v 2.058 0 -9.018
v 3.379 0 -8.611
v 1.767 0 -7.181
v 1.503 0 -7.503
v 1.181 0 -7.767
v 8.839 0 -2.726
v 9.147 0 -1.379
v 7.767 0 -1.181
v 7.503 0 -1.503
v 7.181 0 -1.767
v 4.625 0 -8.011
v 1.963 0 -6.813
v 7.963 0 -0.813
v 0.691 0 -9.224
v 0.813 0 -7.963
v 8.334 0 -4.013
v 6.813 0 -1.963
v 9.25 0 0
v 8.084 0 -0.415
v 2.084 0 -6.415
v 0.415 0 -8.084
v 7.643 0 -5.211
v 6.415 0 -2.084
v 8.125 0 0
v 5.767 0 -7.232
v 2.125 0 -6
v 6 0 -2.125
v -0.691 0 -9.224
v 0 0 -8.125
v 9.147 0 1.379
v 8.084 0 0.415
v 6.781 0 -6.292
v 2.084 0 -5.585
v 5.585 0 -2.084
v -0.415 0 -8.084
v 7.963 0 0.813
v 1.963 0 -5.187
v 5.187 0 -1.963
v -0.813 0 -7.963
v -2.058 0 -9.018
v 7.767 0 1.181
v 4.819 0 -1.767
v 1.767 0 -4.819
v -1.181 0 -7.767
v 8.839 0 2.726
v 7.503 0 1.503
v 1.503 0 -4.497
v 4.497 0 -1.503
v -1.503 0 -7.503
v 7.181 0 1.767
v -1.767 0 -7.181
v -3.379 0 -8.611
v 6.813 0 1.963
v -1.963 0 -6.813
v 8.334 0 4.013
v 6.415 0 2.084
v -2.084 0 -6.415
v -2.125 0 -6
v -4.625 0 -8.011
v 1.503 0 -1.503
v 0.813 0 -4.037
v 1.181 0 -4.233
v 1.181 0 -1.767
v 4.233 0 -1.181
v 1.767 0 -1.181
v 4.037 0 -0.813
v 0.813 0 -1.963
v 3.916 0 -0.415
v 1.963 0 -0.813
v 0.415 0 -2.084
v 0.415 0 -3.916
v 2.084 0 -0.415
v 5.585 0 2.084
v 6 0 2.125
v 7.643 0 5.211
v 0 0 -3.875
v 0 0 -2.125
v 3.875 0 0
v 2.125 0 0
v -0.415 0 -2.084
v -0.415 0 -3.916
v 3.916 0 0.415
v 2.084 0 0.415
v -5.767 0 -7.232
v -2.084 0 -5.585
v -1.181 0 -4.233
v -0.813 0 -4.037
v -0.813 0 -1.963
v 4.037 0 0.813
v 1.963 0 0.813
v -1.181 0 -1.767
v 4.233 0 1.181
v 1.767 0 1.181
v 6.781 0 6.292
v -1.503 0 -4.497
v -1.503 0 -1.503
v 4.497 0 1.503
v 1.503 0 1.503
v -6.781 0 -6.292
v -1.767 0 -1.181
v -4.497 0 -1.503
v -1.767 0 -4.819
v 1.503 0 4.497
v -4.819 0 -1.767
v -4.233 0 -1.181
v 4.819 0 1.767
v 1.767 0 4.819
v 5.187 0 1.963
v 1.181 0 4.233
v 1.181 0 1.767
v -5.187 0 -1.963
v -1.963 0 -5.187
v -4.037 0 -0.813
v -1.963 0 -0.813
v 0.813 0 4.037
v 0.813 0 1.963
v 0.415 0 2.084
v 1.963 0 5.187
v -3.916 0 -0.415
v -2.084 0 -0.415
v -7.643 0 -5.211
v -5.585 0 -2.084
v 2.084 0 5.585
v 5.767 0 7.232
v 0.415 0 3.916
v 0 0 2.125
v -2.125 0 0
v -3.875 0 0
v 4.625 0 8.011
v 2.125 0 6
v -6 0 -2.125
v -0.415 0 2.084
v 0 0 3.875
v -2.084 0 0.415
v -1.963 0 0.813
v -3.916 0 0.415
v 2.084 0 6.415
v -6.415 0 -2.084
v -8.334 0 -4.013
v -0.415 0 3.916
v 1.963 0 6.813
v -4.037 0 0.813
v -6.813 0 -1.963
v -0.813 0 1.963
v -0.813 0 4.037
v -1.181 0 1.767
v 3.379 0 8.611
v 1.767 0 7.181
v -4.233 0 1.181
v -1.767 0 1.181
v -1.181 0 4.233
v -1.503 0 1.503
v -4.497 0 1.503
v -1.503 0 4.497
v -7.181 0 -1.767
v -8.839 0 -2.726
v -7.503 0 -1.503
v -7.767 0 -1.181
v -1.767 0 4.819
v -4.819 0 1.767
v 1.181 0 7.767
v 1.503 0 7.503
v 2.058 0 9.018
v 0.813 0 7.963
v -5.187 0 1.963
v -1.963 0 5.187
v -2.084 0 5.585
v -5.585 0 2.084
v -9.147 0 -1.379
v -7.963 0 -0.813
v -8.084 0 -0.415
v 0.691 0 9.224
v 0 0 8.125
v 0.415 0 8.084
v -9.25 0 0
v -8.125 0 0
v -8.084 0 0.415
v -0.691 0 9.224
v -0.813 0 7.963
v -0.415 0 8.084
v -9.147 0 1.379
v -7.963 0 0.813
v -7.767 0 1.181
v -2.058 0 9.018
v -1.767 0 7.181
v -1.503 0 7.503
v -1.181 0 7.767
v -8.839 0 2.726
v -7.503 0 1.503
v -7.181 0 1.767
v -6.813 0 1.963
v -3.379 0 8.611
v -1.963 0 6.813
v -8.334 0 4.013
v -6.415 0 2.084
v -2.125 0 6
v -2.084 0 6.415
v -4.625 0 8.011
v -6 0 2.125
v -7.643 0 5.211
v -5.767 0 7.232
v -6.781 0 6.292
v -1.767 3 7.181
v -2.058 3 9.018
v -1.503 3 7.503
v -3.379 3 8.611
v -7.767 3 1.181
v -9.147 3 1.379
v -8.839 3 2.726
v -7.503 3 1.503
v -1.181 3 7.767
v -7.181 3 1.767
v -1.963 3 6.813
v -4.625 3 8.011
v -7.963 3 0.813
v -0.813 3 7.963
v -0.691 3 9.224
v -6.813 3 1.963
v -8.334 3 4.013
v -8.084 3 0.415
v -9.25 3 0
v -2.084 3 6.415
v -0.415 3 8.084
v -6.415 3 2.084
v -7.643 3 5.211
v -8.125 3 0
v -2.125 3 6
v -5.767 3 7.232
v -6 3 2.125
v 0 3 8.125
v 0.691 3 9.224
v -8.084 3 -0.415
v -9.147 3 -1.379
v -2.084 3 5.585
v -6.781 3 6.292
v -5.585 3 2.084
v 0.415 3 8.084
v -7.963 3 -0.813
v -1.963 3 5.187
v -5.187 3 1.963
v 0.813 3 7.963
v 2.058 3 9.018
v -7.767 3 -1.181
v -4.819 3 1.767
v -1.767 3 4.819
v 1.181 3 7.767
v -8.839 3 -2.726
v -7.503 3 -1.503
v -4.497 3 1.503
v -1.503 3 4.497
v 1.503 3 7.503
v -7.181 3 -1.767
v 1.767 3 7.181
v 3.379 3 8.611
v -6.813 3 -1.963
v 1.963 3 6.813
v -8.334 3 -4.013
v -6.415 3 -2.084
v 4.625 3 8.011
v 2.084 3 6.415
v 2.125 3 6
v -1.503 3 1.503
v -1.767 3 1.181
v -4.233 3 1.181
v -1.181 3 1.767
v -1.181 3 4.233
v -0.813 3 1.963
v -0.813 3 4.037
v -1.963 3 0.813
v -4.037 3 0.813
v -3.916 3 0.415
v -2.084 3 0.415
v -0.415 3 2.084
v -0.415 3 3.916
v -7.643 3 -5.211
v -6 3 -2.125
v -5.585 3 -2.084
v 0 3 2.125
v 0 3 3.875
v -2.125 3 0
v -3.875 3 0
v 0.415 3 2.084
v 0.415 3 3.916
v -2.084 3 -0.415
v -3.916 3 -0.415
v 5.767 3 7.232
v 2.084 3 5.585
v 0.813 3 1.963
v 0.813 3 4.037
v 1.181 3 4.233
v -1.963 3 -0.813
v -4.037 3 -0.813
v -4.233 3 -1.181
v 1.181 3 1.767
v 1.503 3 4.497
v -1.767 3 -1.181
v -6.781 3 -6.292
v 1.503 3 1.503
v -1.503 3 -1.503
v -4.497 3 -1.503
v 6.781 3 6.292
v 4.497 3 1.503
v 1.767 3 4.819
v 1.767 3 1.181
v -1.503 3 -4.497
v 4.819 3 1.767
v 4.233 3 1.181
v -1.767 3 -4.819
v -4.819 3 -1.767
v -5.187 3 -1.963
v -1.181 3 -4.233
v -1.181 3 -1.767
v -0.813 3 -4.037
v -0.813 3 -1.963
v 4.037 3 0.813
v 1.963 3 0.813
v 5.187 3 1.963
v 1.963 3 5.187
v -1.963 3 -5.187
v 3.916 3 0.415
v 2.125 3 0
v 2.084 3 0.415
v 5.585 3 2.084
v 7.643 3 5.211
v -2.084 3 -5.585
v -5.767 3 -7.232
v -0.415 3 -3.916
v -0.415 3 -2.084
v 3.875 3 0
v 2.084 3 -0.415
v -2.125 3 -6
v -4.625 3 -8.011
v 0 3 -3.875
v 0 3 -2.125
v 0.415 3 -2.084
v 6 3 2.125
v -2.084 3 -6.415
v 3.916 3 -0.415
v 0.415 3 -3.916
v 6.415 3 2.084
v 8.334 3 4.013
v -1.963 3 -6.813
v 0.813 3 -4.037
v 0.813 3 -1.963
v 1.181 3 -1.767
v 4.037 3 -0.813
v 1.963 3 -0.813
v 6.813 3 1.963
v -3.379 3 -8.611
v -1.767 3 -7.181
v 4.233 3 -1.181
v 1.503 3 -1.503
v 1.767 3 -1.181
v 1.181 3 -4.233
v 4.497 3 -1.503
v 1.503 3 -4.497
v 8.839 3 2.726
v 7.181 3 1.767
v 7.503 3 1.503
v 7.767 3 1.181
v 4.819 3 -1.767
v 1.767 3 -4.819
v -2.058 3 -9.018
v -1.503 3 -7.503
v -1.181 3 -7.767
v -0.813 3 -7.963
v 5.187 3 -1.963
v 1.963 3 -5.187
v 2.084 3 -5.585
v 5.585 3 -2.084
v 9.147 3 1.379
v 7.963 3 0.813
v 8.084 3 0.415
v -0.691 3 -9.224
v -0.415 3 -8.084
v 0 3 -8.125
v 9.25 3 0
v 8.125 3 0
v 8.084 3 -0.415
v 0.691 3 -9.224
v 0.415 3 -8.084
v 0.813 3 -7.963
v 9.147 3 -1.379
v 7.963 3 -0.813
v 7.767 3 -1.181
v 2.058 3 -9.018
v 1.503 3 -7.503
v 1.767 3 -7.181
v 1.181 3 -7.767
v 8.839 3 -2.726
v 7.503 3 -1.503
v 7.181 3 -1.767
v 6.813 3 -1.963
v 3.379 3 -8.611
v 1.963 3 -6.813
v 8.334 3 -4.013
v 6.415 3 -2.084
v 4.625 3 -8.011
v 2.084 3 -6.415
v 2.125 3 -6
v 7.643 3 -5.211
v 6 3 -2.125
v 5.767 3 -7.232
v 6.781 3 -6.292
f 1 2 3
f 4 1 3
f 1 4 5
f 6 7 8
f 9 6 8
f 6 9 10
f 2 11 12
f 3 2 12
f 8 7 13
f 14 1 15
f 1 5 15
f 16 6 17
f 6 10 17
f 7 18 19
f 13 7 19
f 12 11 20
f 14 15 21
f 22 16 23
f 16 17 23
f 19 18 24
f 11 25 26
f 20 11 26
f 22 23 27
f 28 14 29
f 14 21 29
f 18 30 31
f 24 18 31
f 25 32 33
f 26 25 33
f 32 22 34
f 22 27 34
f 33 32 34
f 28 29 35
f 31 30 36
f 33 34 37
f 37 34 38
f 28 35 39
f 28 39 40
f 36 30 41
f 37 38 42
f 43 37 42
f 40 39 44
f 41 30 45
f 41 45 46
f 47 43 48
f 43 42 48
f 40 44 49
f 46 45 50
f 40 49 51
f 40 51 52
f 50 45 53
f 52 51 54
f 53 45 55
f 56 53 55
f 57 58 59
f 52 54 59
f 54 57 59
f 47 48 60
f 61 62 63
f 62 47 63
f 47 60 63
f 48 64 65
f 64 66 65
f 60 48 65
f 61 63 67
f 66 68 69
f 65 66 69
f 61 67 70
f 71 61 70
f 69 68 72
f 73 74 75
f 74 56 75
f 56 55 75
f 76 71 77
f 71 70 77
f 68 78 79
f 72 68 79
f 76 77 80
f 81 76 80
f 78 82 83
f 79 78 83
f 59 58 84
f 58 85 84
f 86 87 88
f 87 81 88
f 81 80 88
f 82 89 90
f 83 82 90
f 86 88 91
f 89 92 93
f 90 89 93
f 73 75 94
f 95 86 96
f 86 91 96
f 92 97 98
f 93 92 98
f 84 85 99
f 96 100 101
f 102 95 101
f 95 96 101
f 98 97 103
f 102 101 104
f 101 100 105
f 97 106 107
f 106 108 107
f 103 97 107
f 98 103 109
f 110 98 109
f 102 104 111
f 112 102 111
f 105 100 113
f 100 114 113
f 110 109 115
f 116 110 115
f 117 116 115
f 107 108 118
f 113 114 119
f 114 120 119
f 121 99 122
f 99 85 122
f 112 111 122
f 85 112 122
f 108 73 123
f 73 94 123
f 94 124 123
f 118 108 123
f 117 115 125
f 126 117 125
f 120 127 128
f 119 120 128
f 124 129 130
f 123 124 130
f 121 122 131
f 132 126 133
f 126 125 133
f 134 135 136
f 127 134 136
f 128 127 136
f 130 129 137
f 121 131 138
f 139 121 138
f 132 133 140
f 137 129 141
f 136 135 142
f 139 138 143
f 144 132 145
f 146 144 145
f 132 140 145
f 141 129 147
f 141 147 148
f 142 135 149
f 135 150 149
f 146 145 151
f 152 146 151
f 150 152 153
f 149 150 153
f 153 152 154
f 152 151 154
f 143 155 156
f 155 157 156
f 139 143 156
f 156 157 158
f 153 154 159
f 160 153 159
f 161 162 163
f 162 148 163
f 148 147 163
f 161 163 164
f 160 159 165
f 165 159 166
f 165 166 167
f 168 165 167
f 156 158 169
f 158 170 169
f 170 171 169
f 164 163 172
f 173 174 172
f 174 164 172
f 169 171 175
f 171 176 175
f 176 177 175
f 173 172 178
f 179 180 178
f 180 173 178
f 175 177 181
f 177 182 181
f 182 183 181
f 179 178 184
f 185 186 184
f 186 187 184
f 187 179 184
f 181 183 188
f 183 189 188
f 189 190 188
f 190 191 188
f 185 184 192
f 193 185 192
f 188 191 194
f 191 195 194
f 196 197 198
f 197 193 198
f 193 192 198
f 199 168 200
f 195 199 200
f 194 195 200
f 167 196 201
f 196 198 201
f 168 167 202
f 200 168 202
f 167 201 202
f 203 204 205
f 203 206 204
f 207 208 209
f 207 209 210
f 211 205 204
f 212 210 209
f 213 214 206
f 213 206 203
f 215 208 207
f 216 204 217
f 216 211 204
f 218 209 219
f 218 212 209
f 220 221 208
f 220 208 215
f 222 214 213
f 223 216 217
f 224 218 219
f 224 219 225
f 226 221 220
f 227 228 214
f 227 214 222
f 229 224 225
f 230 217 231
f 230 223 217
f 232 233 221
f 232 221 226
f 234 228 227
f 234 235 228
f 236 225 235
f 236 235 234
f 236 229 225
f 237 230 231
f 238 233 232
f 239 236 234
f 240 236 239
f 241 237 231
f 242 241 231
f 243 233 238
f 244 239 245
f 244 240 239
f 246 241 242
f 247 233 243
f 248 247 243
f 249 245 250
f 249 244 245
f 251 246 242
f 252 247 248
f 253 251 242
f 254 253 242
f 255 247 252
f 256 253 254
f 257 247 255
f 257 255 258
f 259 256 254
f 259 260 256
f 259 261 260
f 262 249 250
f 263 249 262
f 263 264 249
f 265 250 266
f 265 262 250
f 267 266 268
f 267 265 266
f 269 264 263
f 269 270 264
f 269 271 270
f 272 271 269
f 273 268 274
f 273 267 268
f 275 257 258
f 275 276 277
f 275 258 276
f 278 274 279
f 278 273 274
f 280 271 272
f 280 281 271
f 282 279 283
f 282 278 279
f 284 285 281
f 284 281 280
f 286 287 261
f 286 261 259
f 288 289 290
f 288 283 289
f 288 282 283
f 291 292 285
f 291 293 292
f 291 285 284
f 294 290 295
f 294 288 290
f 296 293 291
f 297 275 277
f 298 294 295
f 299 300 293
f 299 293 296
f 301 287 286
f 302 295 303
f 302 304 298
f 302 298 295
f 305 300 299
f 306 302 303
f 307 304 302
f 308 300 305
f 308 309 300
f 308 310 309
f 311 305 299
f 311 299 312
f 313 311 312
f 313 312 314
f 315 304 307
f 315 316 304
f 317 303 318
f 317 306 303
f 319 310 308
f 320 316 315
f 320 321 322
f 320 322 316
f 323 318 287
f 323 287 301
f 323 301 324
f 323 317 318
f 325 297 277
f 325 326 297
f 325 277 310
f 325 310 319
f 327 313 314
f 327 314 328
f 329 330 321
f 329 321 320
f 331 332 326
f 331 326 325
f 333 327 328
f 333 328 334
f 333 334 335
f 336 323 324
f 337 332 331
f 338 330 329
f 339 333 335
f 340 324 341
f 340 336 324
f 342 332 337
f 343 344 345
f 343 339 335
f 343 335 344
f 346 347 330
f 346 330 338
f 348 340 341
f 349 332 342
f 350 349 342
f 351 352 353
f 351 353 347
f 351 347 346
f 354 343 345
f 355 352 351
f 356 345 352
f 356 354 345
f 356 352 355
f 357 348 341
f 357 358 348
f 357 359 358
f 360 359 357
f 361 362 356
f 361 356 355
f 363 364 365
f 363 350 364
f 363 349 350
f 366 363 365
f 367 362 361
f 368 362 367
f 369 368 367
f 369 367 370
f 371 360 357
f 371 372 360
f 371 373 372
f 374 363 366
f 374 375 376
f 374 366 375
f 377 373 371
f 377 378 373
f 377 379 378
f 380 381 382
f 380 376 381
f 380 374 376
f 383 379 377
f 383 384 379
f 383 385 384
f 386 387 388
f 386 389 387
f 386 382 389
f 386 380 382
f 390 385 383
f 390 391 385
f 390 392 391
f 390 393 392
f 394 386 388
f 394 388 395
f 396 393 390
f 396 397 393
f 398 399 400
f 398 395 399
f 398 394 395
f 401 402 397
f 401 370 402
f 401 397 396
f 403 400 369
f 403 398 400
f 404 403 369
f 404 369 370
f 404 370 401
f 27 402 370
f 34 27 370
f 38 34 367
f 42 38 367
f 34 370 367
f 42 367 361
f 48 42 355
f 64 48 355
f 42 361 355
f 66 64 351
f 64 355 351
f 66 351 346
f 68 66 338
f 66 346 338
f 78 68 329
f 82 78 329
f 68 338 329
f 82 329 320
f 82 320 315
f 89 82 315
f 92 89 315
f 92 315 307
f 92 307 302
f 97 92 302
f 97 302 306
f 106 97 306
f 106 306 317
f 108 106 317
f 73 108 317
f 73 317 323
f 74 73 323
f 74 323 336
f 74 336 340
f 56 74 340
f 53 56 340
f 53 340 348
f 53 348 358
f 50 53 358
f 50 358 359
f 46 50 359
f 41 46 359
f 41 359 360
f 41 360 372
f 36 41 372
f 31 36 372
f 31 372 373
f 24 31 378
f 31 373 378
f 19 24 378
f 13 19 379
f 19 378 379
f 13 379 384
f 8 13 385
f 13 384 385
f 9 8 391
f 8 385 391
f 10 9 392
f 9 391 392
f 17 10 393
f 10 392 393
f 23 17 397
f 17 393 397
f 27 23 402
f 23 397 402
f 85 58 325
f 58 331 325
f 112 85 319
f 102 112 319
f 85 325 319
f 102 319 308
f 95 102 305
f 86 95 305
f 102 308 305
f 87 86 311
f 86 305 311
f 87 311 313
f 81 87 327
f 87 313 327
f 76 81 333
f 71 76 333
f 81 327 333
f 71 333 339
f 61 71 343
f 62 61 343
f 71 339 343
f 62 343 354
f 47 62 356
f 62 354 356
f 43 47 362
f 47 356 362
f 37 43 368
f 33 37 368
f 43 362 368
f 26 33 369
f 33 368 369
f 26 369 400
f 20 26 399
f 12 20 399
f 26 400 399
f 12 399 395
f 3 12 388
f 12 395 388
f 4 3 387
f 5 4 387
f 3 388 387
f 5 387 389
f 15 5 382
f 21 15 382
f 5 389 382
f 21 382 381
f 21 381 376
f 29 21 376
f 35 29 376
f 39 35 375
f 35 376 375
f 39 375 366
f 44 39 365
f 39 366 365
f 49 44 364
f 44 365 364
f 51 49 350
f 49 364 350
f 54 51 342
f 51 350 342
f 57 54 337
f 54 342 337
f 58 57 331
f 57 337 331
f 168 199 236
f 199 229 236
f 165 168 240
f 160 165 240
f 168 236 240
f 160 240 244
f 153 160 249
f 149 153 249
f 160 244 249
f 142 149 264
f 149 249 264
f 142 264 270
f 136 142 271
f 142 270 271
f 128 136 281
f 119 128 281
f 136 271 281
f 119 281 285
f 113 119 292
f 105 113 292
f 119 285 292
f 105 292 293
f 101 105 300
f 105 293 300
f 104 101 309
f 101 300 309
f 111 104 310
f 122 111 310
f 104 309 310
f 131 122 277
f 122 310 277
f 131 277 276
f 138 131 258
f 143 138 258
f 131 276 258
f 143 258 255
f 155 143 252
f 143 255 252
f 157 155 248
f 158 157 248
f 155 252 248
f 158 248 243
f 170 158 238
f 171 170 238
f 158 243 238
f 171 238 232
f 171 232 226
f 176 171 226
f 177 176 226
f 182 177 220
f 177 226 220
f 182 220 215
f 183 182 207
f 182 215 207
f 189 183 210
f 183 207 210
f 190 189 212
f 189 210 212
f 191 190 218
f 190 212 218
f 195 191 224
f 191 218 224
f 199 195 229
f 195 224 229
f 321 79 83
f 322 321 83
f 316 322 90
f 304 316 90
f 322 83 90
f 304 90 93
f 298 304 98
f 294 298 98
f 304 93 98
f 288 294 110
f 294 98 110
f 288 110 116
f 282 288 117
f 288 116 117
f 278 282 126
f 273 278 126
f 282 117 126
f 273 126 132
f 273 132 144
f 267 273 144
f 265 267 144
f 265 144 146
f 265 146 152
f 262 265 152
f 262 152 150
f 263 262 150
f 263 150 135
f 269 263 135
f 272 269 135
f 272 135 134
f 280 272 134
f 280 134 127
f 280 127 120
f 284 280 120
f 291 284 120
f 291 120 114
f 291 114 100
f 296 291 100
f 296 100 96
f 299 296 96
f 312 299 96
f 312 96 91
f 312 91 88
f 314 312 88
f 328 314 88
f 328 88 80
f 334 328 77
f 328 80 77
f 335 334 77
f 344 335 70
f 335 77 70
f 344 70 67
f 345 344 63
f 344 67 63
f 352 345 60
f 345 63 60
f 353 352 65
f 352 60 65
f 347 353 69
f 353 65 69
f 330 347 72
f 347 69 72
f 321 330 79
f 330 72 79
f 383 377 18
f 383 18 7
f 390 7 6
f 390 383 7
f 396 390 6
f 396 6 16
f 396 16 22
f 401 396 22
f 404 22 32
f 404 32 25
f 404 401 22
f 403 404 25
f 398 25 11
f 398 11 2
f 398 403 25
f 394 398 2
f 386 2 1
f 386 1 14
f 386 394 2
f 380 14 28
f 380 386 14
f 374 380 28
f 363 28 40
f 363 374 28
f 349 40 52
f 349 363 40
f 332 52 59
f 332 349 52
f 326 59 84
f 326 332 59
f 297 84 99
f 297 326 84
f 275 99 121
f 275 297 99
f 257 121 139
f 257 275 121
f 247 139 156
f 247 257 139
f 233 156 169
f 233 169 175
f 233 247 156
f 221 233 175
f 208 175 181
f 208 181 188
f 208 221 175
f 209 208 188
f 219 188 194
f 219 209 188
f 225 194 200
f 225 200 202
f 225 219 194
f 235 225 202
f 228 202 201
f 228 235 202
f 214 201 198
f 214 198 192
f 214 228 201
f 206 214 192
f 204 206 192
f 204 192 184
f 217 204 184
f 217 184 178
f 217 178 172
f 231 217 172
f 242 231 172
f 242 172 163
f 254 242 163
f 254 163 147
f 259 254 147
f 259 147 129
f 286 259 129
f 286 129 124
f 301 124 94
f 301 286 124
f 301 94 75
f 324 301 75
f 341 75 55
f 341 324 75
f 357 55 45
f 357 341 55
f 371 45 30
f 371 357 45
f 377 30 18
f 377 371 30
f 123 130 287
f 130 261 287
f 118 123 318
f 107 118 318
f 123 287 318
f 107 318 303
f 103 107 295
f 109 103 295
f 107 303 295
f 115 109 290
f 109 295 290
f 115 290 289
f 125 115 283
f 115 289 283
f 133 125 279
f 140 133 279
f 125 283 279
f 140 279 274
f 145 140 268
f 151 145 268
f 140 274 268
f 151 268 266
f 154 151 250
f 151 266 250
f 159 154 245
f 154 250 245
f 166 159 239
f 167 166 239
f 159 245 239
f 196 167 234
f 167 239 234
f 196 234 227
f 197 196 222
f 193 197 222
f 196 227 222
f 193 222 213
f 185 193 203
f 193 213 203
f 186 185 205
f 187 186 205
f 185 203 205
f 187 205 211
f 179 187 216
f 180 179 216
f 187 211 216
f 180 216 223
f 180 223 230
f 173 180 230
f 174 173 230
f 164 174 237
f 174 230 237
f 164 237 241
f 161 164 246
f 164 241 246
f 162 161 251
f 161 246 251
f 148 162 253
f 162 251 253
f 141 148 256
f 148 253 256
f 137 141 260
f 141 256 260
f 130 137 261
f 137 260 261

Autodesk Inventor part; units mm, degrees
ref_plane "YZ Plane" through (0, 0, 0) normal (1, 0, 0) x (0, 1, 0)
ref_plane "XZ Plane" through (0, 0, 0) normal (0, 1, 0) x (-1, 0, 0)
ref_plane "XY Plane" through (0, 0, 0) normal (0, 0, 1) x (1, 0, 0)
sketch "Sketch1" plane through (0, 0, 0) normal (0, 1, 0) x (-1, 0, 0)
  line L0 (0, 0) -> (0, -19.05)
  circle A0 centre (0, -19.05) radius 4
  circle A1 centre (0, 0) radius 25
  dimension "d0" = 19.05
  dimension "d1" = 8
  dimension "d2" = 50
extrude "Extrusion1" add sketch "Sketch1" along normal blind 5 contours A0 | A1
sketch "Sketch2" plane through (0, 5, 0) normal (0, 1, 0) x (1, 0, 0)
  line L0 (0, 0) -> (0, 19.05)
  circle A0 centre (0, 19.05) radius 3.9
  dimension "d5" = 19.05
  dimension "d6" = 7.8
extrude "Extrusion2" add sketch "Sketch2" along normal blind 9
sketch "Sketch4" plane through (0, 5, 0) normal (0, 1, 0) x (1, 0, 0)
  circle A0 centre (0, 0) radius 9.25
  dimension "d9" = 18.5
extrude "Extrusion3" cut sketch "Sketch4" against normal blind 2
sketch "Sketch5" plane through (0, 3, 0) normal (0, 1, 0) x (1, 0, 0)
  line L0 (0, 0) -> (0, -6)
  circle A0 centre (0, -6) radius 2.125
  dimension "d12" = 6
  dimension "d13" = 4.25
extrude "Extrusion4" cut sketch "Sketch5" against normal through all
pattern_circular "Circular Pattern1" count 4 over 360 about axis through (0, 0, 0) along (0, 1, 0) of "Extrusion4"
sketch "Sketch6" plane through (0, 0, 0) normal (0, -1, 0) x (1, 0, 0)
  circle A0 centre (0, 0) radius 9
  circle A1 centre (0, 0) radius 2.125
  dimension "d19" = 18
  dimension "d20" = 4.25
extrude "Extrusion5" cut sketch "Sketch6" against normal through all contours A1
sketch "Sketch7" plane through (0, 5, 0) normal (0, 1, 0) x (1, 0, 0)
  point P0 (0, 0)
sketch "Sketch8" plane through (0, 5, 0) normal (0, 1, 0) x (1, 0, 0)
  circle A0 centre (0, 0) radius 9.25
  circle A1 centre (0, 0) radius 25
extrude "Extrusion6" cut sketch "Sketch8" along normal through all both and the other way through all
properties part number "Picker"
